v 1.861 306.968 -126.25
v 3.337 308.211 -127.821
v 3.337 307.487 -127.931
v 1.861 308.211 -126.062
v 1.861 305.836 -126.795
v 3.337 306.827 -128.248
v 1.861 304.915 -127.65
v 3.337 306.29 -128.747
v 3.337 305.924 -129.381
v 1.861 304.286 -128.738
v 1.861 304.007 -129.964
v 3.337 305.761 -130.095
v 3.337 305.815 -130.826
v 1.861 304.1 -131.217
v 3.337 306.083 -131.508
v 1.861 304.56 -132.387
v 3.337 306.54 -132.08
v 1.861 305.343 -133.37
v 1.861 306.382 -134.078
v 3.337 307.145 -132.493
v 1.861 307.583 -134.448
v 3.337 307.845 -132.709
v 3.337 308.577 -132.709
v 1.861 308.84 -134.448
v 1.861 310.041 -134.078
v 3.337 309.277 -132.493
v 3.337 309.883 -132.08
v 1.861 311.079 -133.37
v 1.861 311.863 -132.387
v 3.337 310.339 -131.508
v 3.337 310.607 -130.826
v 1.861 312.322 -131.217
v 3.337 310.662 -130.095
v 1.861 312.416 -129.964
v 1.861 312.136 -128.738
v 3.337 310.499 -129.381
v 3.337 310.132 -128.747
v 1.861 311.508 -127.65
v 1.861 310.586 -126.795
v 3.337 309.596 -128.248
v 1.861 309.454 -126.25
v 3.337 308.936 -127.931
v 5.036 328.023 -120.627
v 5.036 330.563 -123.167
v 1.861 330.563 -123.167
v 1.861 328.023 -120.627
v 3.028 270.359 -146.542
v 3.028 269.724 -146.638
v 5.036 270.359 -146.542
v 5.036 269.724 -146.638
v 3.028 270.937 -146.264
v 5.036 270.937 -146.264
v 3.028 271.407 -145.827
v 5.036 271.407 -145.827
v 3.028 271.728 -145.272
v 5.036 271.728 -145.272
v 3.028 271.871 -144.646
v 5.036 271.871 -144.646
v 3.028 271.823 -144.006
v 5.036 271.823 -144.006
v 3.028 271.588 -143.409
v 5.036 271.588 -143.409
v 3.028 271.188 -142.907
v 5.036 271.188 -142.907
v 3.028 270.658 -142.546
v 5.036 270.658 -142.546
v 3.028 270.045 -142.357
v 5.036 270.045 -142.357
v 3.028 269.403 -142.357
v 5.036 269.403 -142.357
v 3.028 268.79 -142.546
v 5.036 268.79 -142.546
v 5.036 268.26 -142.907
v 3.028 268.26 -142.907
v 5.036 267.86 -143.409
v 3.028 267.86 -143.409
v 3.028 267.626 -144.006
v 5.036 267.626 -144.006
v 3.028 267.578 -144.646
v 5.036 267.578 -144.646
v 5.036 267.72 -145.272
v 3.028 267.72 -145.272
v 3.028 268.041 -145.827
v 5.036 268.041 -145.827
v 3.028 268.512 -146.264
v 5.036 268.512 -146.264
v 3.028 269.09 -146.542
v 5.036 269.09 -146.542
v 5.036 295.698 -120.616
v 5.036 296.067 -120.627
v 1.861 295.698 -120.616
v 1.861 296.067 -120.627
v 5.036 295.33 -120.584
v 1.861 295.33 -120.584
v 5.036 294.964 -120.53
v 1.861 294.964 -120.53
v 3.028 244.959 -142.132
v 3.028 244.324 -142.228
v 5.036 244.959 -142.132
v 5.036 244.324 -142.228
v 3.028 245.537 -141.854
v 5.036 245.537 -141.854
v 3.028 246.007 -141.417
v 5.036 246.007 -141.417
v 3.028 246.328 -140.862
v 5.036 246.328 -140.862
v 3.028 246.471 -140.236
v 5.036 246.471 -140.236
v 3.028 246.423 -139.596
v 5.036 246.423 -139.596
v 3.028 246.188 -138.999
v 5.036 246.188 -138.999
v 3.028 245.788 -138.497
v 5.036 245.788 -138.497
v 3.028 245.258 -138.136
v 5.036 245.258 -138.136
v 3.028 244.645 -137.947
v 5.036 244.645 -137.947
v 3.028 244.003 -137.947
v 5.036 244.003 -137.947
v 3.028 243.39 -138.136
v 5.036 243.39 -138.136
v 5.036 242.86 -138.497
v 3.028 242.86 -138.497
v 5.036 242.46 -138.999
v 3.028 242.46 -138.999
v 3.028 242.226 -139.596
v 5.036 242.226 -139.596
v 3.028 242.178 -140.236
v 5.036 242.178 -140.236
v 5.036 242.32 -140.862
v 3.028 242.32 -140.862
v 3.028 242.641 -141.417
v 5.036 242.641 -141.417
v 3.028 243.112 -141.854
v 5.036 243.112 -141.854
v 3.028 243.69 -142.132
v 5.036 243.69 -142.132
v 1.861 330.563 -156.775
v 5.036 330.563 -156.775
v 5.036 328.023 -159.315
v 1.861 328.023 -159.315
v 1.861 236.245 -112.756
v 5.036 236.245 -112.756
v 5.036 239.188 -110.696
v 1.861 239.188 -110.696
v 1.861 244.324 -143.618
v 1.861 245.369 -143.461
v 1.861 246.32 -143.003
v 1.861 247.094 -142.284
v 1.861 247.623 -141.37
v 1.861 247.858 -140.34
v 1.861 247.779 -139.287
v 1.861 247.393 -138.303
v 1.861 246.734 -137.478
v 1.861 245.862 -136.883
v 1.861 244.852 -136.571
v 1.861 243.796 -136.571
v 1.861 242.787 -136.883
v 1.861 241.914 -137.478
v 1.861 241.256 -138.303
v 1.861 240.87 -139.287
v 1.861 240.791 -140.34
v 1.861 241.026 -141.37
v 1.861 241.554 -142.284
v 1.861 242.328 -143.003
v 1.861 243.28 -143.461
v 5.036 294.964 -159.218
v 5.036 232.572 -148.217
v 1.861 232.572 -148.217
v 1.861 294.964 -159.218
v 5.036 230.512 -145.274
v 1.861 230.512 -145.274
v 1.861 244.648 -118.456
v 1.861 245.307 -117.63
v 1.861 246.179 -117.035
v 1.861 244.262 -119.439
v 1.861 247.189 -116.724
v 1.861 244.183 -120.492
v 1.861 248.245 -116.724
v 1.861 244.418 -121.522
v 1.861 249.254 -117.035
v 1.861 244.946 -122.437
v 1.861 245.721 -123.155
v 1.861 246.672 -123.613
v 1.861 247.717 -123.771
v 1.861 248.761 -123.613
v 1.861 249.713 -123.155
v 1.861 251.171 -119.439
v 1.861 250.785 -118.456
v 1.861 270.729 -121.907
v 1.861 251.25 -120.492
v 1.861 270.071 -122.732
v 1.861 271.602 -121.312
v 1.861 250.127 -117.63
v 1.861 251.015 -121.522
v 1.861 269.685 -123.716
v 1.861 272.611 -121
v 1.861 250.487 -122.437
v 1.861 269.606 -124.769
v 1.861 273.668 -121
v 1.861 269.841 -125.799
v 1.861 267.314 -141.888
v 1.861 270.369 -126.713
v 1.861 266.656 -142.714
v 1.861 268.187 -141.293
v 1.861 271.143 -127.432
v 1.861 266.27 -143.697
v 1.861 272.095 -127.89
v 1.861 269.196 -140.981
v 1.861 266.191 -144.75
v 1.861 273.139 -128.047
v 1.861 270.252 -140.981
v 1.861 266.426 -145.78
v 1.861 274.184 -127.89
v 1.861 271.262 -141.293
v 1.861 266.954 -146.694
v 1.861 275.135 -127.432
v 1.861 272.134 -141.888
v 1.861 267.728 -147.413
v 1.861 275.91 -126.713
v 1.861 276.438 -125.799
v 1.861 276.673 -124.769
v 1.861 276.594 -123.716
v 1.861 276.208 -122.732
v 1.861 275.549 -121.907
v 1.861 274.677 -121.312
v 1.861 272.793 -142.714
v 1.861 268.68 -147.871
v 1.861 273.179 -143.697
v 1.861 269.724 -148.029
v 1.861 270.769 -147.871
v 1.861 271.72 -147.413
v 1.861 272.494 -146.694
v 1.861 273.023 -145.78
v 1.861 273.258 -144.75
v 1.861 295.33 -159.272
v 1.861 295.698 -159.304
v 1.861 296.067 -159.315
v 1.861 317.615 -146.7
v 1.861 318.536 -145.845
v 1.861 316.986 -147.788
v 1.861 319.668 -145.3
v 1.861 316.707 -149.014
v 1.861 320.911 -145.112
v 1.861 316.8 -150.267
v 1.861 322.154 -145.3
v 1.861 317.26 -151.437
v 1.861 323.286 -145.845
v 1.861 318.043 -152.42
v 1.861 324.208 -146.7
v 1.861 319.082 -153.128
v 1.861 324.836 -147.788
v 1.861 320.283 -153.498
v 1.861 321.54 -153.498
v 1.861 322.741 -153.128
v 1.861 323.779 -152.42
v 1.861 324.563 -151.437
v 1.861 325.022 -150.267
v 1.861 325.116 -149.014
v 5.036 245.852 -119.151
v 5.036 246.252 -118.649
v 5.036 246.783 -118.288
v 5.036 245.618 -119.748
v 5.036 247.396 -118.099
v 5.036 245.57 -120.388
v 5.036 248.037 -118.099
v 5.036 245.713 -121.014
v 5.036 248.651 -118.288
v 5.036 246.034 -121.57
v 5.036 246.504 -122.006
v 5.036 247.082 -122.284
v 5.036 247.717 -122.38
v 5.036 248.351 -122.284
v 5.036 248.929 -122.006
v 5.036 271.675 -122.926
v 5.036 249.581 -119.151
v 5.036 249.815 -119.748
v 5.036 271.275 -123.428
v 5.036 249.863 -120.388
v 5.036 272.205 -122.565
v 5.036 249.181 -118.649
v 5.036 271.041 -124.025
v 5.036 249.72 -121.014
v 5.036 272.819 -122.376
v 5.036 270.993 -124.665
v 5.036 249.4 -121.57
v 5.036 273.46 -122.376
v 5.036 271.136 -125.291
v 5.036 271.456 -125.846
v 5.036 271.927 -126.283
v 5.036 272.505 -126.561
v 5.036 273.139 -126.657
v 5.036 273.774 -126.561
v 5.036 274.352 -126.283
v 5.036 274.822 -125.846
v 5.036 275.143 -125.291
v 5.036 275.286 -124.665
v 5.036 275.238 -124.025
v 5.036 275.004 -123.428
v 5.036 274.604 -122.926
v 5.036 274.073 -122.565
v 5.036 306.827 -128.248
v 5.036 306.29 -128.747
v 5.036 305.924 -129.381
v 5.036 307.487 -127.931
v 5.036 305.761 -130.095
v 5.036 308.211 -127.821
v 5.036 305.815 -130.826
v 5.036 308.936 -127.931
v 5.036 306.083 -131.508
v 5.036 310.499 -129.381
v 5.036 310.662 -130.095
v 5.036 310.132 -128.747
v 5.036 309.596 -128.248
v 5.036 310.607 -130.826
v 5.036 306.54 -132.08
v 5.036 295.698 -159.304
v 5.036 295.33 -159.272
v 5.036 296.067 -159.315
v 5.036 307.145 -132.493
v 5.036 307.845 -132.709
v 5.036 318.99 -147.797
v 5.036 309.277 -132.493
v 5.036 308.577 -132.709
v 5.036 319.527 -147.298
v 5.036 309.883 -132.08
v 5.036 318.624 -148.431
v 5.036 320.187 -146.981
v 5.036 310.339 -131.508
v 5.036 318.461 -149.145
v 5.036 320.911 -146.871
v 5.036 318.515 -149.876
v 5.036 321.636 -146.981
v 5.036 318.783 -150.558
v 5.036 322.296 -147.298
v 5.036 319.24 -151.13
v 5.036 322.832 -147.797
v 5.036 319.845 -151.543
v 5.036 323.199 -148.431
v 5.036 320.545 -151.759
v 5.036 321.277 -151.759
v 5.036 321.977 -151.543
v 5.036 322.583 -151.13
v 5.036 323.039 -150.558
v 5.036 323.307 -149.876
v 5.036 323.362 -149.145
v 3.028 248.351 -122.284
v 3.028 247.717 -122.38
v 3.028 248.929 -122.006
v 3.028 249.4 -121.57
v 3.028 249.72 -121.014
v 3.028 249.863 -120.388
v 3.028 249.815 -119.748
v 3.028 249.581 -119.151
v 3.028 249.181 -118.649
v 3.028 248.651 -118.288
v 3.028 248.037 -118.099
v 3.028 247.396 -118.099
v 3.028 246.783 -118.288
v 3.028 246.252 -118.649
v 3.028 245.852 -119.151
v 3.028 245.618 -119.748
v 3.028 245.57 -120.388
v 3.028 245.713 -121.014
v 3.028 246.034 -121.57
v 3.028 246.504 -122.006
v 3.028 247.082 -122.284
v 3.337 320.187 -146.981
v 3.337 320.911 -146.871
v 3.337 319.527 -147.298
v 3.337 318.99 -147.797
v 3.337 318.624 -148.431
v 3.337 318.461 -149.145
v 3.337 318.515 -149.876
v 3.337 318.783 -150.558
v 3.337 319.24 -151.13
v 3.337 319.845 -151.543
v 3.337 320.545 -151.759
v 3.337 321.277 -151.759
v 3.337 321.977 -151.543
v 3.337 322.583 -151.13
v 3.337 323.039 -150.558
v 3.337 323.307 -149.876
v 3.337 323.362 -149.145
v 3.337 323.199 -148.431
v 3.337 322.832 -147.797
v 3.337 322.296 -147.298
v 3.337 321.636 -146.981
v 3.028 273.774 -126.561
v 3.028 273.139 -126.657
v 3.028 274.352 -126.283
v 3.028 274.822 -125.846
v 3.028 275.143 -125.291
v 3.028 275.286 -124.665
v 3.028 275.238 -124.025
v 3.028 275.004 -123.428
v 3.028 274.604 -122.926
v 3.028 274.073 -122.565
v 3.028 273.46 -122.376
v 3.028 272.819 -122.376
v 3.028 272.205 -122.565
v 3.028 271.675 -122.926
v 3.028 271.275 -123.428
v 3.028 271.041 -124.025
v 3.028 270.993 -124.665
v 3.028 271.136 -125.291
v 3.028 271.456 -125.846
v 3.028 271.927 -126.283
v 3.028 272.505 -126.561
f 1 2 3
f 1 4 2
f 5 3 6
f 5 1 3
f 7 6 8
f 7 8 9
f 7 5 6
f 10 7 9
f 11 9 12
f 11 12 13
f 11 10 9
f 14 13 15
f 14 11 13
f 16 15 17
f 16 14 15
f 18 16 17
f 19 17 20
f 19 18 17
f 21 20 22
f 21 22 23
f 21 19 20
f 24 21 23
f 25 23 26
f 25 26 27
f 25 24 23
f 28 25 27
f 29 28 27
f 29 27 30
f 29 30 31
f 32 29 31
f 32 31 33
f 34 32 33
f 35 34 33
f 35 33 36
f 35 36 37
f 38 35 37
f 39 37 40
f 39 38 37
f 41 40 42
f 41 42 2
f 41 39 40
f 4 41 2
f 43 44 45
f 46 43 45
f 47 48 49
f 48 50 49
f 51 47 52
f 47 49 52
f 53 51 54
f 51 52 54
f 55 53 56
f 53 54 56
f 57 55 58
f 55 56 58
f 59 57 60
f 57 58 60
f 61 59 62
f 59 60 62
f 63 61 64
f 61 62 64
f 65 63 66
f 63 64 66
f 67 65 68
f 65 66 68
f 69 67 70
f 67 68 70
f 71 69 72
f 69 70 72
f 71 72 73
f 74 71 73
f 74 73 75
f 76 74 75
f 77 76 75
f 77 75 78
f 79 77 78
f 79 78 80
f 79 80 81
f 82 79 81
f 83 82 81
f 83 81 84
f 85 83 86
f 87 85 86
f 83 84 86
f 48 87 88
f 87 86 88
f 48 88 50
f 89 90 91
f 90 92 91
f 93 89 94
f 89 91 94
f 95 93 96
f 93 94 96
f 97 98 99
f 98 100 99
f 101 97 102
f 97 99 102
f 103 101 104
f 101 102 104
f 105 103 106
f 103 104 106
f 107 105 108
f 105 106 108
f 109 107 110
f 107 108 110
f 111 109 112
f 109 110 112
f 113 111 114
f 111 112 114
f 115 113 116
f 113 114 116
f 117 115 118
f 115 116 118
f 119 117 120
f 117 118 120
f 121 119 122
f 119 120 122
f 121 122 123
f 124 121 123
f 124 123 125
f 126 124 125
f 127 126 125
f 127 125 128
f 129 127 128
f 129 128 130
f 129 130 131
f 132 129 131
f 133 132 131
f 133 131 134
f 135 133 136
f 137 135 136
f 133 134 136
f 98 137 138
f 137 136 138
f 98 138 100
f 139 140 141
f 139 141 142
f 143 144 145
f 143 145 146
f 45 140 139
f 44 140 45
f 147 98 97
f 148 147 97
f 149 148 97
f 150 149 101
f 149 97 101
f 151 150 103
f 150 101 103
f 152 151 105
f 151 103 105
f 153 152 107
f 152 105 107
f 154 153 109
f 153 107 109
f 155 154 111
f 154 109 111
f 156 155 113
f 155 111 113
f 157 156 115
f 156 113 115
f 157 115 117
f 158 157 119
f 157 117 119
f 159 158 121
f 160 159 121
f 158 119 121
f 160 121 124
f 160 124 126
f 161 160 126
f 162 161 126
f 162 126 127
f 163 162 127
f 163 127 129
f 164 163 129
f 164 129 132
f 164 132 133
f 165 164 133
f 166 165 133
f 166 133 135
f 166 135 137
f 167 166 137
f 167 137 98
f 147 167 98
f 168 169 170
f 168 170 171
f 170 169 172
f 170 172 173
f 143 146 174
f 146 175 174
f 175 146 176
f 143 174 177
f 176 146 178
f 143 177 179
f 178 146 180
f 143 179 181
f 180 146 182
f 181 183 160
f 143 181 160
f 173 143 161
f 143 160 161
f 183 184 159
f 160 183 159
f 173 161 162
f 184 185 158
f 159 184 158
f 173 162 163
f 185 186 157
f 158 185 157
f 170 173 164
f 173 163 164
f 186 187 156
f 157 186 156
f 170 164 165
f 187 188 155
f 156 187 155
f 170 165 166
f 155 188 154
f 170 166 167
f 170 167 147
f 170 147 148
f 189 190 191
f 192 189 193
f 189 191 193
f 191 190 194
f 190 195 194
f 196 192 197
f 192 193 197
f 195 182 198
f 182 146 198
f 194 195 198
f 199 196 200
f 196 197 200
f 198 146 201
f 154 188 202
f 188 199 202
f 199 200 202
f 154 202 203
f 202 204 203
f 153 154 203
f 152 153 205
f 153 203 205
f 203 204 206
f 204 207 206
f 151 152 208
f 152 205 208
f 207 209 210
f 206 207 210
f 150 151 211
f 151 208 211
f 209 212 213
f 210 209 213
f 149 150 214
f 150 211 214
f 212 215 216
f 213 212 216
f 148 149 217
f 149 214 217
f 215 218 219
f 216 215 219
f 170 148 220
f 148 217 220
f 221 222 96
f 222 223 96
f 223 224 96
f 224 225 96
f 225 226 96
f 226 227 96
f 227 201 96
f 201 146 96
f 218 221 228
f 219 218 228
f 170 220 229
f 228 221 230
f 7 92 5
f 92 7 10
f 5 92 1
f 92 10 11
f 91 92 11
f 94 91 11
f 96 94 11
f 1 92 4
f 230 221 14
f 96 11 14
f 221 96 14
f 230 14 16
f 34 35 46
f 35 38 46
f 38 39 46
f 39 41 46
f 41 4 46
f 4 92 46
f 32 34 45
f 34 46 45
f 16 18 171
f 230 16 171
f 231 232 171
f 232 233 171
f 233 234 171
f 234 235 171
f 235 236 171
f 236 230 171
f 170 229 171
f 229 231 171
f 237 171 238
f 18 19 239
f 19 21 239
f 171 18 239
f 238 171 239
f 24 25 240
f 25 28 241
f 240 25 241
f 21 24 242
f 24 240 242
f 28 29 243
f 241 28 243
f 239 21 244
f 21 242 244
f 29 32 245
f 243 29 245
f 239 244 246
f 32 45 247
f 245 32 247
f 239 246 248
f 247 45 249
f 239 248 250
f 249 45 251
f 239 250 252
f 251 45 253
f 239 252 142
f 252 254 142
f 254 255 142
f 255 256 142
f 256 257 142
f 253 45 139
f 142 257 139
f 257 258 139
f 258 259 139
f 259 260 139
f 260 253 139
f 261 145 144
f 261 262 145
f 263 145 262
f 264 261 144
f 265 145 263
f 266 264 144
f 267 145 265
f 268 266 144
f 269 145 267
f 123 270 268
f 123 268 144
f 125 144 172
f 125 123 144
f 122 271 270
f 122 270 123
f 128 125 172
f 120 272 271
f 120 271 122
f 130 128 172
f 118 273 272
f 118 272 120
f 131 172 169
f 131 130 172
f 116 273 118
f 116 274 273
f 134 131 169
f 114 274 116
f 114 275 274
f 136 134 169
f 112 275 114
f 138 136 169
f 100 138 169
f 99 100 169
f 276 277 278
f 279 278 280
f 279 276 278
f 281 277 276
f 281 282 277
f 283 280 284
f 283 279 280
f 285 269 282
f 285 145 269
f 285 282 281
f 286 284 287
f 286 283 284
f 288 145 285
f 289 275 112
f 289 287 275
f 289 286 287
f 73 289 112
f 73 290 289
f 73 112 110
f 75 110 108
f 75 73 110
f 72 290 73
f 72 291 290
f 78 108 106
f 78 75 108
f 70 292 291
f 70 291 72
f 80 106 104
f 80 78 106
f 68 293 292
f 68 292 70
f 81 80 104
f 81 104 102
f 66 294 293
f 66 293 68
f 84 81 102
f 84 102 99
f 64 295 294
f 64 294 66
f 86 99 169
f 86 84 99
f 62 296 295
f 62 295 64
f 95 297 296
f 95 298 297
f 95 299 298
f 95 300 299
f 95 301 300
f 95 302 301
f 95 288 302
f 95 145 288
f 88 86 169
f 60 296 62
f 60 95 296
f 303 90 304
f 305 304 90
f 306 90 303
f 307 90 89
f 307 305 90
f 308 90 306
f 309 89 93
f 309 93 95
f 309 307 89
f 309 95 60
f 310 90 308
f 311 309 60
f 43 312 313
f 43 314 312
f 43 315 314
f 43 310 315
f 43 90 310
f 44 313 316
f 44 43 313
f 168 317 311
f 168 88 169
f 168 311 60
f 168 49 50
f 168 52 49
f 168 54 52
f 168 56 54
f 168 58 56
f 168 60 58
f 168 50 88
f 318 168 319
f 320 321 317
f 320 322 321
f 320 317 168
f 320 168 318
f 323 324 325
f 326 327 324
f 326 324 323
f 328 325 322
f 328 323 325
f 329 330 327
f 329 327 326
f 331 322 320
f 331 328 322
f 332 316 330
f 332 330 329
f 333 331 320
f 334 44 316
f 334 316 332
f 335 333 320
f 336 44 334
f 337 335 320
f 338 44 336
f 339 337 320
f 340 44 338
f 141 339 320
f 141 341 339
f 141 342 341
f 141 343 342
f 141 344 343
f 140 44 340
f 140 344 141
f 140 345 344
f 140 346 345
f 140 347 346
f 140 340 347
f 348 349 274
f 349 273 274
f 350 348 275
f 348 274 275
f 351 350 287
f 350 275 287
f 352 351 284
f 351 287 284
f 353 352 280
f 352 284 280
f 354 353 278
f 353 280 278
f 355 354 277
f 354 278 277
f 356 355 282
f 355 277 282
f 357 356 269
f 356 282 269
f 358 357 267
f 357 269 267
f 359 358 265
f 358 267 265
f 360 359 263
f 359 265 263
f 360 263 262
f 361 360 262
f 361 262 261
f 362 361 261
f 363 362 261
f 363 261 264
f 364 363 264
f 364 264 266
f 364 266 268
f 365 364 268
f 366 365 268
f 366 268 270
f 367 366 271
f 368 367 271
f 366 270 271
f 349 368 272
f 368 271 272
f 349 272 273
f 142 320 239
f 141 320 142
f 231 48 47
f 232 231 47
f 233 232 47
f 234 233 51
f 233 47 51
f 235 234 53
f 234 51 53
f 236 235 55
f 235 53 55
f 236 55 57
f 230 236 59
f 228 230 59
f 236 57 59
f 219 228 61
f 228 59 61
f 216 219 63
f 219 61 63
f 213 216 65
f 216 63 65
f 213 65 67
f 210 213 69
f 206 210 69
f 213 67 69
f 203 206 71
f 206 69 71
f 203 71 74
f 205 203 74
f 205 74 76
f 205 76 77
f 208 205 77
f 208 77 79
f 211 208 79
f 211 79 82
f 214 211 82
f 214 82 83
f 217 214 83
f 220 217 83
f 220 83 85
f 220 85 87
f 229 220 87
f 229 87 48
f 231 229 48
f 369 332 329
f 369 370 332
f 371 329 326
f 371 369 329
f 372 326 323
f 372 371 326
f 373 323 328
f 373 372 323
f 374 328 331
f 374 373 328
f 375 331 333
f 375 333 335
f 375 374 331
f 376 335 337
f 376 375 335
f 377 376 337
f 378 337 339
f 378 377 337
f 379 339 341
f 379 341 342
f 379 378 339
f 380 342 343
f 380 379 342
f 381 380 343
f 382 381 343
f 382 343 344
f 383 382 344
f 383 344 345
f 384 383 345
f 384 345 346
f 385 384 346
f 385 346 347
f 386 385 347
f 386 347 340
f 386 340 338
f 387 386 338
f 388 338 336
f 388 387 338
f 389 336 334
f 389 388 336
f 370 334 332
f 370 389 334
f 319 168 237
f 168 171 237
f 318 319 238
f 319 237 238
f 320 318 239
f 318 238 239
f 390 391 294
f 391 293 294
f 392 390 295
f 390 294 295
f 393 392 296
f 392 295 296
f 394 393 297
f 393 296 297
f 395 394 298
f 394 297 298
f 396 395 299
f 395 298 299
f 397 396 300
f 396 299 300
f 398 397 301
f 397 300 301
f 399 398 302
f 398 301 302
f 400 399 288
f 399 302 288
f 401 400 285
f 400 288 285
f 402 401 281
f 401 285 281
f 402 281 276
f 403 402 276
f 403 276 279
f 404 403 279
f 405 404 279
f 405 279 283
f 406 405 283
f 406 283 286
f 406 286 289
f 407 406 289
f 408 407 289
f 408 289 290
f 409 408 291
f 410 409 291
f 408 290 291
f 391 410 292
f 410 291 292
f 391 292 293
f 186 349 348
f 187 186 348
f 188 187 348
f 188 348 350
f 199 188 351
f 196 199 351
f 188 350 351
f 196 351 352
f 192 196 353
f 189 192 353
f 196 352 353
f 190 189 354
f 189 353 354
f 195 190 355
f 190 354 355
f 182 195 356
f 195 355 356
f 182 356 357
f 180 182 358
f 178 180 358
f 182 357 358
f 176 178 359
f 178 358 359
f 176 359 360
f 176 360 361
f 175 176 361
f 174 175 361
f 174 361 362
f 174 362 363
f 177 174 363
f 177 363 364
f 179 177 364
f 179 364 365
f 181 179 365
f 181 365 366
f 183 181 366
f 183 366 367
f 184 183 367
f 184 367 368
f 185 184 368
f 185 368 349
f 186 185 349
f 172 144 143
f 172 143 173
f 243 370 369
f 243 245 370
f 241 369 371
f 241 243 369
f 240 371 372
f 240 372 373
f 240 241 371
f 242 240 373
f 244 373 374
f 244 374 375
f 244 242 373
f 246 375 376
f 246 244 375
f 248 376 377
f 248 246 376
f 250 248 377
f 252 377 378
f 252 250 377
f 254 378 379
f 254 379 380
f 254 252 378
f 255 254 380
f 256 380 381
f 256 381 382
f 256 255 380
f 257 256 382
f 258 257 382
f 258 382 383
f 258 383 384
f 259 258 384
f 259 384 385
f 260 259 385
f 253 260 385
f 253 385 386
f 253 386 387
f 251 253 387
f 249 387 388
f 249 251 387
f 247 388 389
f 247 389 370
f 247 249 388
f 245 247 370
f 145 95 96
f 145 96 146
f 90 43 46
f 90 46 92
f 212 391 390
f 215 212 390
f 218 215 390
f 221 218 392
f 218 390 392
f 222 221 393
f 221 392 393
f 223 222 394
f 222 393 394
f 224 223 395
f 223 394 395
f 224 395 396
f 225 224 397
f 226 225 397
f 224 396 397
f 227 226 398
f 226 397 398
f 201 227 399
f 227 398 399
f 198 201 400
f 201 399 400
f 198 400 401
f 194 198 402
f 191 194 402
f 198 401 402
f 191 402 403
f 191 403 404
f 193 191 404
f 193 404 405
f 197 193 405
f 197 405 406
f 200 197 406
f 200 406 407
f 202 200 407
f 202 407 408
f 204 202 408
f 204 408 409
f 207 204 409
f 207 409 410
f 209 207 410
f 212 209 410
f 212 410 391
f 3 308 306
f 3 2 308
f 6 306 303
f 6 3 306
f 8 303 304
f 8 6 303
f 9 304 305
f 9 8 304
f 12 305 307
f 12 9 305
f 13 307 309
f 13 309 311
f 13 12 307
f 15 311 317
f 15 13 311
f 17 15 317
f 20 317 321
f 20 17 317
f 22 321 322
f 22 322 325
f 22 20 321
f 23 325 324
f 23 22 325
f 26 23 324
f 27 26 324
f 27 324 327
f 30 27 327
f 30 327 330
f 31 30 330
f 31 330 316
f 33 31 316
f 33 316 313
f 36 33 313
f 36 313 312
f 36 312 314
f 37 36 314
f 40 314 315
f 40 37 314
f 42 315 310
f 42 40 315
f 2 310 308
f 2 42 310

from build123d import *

# Parameters (mm, degrees)
BOSS_EXTRUDE1_DEPTH                               = 3.175
FILLET1_R                                         = 6.35
CSK_FOR_6_FLAT_HEAD_MACHINE_SCREW_100_D           = 4.3053
CSK_FOR_6_FLAT_HEAD_MACHINE_SCREW_100_CSINK_D     = 7.0866
CSK_FOR_6_FLAT_HEAD_MACHINE_SCREW_100_CSINK_ANGLE = 100
CSK_FOR_8_FLAT_HEAD_MACHINE_SCREW_2_COUNT         = 2
CSK_FOR_8_FLAT_HEAD_MACHINE_SCREW_2_PITCH         = 22.895250599
CHAMFER1_SIZE                                     = 2.54


with BuildPart() as part:
    # Sketch1 → Boss-Extrude1 (new body)
    with BuildSketch(Plane.ZY.offset(-5.035827965)):
        Polygon((-147.77562455, 230.070458845), (-159.314588786, 295.511176933), (-159.314588786, 330.563176933), (-120.626834873, 330.563176933), (-120.626834873, 295.511176933), (-110.25444916, 236.686454414), align=None)
    extrude(amount=BOSS_EXTRUDE1_DEPTH)

    # Fillet1
    fillet1_edges = [part.edges().sort_by_distance(p)[0] for p in [
        (3.448327965, 295.511176933, -159.314588786),
        (3.448327965, 295.511176933, -120.626834873),
    ]]
    fillet(fillet1_edges, radius=FILLET1_R)

    # CSK for #6 Flat Head Machine Screw (100)1 (through all)
    with Locations(Plane.ZY.offset(-1.860827965)):
        with Locations((-124.504125043, 273.139415456), (-144.485224025, 269.724179148), (-140.075144867, 244.324179148), (-120.227402214, 247.716621746)):
            CounterSinkHole(CSK_FOR_6_FLAT_HEAD_MACHINE_SCREW_100_D / 2, CSK_FOR_6_FLAT_HEAD_MACHINE_SCREW_100_CSINK_D / 2, counter_sink_angle=CSK_FOR_6_FLAT_HEAD_MACHINE_SCREW_100_CSINK_ANGLE)

    # Sketch5 → CSK for #8 Flat Head Machine Screw (100)1 (revolve, cut)
    with BuildSketch(Plane(origin=(1.860827965, 320.911176933, -149.328834873), x_dir=(0, 0, 1), z_dir=(0, 1, 0))):
        Polygon((0, 0), (0, 3.175), (2.45745, 3.175), (2.45745, 1.475934296), (4.2164, 0), align=None)
    csk_for_8_flat_head_machine_screw_100 = revolve(axis=Axis((-4.489172035, 320.911176933, -149.328834873), (1, 0, 0)), mode=Mode.SUBTRACT)

    # CSK for _8 Flat Head Machine Screw _ 2: CSK for #8 Flat Head Machine Screw (100)1 ×2
    with Locations(*[Vector(0, -0.554700196, 0.832050294) * (i * CSK_FOR_8_FLAT_HEAD_MACHINE_SCREW_2_PITCH) for i in range(1, CSK_FOR_8_FLAT_HEAD_MACHINE_SCREW_2_COUNT)]):
        add(csk_for_8_flat_head_machine_screw_100, mode=Mode.SUBTRACT)

    # Chamfer1
    chamfer1_edges = [part.edges().sort_by_distance(p)[0] for p in [
        (3.448327965, 230.070458845, -147.77562455),
        (3.448327965, 330.563176933, -159.314588786),
        (3.448327965, 330.563176933, -120.626834873),
        (3.448327965, 236.686454414, -110.25444916),
    ]]
    chamfer(chamfer1_edges, length=CHAMFER1_SIZE)


solid = part.part
